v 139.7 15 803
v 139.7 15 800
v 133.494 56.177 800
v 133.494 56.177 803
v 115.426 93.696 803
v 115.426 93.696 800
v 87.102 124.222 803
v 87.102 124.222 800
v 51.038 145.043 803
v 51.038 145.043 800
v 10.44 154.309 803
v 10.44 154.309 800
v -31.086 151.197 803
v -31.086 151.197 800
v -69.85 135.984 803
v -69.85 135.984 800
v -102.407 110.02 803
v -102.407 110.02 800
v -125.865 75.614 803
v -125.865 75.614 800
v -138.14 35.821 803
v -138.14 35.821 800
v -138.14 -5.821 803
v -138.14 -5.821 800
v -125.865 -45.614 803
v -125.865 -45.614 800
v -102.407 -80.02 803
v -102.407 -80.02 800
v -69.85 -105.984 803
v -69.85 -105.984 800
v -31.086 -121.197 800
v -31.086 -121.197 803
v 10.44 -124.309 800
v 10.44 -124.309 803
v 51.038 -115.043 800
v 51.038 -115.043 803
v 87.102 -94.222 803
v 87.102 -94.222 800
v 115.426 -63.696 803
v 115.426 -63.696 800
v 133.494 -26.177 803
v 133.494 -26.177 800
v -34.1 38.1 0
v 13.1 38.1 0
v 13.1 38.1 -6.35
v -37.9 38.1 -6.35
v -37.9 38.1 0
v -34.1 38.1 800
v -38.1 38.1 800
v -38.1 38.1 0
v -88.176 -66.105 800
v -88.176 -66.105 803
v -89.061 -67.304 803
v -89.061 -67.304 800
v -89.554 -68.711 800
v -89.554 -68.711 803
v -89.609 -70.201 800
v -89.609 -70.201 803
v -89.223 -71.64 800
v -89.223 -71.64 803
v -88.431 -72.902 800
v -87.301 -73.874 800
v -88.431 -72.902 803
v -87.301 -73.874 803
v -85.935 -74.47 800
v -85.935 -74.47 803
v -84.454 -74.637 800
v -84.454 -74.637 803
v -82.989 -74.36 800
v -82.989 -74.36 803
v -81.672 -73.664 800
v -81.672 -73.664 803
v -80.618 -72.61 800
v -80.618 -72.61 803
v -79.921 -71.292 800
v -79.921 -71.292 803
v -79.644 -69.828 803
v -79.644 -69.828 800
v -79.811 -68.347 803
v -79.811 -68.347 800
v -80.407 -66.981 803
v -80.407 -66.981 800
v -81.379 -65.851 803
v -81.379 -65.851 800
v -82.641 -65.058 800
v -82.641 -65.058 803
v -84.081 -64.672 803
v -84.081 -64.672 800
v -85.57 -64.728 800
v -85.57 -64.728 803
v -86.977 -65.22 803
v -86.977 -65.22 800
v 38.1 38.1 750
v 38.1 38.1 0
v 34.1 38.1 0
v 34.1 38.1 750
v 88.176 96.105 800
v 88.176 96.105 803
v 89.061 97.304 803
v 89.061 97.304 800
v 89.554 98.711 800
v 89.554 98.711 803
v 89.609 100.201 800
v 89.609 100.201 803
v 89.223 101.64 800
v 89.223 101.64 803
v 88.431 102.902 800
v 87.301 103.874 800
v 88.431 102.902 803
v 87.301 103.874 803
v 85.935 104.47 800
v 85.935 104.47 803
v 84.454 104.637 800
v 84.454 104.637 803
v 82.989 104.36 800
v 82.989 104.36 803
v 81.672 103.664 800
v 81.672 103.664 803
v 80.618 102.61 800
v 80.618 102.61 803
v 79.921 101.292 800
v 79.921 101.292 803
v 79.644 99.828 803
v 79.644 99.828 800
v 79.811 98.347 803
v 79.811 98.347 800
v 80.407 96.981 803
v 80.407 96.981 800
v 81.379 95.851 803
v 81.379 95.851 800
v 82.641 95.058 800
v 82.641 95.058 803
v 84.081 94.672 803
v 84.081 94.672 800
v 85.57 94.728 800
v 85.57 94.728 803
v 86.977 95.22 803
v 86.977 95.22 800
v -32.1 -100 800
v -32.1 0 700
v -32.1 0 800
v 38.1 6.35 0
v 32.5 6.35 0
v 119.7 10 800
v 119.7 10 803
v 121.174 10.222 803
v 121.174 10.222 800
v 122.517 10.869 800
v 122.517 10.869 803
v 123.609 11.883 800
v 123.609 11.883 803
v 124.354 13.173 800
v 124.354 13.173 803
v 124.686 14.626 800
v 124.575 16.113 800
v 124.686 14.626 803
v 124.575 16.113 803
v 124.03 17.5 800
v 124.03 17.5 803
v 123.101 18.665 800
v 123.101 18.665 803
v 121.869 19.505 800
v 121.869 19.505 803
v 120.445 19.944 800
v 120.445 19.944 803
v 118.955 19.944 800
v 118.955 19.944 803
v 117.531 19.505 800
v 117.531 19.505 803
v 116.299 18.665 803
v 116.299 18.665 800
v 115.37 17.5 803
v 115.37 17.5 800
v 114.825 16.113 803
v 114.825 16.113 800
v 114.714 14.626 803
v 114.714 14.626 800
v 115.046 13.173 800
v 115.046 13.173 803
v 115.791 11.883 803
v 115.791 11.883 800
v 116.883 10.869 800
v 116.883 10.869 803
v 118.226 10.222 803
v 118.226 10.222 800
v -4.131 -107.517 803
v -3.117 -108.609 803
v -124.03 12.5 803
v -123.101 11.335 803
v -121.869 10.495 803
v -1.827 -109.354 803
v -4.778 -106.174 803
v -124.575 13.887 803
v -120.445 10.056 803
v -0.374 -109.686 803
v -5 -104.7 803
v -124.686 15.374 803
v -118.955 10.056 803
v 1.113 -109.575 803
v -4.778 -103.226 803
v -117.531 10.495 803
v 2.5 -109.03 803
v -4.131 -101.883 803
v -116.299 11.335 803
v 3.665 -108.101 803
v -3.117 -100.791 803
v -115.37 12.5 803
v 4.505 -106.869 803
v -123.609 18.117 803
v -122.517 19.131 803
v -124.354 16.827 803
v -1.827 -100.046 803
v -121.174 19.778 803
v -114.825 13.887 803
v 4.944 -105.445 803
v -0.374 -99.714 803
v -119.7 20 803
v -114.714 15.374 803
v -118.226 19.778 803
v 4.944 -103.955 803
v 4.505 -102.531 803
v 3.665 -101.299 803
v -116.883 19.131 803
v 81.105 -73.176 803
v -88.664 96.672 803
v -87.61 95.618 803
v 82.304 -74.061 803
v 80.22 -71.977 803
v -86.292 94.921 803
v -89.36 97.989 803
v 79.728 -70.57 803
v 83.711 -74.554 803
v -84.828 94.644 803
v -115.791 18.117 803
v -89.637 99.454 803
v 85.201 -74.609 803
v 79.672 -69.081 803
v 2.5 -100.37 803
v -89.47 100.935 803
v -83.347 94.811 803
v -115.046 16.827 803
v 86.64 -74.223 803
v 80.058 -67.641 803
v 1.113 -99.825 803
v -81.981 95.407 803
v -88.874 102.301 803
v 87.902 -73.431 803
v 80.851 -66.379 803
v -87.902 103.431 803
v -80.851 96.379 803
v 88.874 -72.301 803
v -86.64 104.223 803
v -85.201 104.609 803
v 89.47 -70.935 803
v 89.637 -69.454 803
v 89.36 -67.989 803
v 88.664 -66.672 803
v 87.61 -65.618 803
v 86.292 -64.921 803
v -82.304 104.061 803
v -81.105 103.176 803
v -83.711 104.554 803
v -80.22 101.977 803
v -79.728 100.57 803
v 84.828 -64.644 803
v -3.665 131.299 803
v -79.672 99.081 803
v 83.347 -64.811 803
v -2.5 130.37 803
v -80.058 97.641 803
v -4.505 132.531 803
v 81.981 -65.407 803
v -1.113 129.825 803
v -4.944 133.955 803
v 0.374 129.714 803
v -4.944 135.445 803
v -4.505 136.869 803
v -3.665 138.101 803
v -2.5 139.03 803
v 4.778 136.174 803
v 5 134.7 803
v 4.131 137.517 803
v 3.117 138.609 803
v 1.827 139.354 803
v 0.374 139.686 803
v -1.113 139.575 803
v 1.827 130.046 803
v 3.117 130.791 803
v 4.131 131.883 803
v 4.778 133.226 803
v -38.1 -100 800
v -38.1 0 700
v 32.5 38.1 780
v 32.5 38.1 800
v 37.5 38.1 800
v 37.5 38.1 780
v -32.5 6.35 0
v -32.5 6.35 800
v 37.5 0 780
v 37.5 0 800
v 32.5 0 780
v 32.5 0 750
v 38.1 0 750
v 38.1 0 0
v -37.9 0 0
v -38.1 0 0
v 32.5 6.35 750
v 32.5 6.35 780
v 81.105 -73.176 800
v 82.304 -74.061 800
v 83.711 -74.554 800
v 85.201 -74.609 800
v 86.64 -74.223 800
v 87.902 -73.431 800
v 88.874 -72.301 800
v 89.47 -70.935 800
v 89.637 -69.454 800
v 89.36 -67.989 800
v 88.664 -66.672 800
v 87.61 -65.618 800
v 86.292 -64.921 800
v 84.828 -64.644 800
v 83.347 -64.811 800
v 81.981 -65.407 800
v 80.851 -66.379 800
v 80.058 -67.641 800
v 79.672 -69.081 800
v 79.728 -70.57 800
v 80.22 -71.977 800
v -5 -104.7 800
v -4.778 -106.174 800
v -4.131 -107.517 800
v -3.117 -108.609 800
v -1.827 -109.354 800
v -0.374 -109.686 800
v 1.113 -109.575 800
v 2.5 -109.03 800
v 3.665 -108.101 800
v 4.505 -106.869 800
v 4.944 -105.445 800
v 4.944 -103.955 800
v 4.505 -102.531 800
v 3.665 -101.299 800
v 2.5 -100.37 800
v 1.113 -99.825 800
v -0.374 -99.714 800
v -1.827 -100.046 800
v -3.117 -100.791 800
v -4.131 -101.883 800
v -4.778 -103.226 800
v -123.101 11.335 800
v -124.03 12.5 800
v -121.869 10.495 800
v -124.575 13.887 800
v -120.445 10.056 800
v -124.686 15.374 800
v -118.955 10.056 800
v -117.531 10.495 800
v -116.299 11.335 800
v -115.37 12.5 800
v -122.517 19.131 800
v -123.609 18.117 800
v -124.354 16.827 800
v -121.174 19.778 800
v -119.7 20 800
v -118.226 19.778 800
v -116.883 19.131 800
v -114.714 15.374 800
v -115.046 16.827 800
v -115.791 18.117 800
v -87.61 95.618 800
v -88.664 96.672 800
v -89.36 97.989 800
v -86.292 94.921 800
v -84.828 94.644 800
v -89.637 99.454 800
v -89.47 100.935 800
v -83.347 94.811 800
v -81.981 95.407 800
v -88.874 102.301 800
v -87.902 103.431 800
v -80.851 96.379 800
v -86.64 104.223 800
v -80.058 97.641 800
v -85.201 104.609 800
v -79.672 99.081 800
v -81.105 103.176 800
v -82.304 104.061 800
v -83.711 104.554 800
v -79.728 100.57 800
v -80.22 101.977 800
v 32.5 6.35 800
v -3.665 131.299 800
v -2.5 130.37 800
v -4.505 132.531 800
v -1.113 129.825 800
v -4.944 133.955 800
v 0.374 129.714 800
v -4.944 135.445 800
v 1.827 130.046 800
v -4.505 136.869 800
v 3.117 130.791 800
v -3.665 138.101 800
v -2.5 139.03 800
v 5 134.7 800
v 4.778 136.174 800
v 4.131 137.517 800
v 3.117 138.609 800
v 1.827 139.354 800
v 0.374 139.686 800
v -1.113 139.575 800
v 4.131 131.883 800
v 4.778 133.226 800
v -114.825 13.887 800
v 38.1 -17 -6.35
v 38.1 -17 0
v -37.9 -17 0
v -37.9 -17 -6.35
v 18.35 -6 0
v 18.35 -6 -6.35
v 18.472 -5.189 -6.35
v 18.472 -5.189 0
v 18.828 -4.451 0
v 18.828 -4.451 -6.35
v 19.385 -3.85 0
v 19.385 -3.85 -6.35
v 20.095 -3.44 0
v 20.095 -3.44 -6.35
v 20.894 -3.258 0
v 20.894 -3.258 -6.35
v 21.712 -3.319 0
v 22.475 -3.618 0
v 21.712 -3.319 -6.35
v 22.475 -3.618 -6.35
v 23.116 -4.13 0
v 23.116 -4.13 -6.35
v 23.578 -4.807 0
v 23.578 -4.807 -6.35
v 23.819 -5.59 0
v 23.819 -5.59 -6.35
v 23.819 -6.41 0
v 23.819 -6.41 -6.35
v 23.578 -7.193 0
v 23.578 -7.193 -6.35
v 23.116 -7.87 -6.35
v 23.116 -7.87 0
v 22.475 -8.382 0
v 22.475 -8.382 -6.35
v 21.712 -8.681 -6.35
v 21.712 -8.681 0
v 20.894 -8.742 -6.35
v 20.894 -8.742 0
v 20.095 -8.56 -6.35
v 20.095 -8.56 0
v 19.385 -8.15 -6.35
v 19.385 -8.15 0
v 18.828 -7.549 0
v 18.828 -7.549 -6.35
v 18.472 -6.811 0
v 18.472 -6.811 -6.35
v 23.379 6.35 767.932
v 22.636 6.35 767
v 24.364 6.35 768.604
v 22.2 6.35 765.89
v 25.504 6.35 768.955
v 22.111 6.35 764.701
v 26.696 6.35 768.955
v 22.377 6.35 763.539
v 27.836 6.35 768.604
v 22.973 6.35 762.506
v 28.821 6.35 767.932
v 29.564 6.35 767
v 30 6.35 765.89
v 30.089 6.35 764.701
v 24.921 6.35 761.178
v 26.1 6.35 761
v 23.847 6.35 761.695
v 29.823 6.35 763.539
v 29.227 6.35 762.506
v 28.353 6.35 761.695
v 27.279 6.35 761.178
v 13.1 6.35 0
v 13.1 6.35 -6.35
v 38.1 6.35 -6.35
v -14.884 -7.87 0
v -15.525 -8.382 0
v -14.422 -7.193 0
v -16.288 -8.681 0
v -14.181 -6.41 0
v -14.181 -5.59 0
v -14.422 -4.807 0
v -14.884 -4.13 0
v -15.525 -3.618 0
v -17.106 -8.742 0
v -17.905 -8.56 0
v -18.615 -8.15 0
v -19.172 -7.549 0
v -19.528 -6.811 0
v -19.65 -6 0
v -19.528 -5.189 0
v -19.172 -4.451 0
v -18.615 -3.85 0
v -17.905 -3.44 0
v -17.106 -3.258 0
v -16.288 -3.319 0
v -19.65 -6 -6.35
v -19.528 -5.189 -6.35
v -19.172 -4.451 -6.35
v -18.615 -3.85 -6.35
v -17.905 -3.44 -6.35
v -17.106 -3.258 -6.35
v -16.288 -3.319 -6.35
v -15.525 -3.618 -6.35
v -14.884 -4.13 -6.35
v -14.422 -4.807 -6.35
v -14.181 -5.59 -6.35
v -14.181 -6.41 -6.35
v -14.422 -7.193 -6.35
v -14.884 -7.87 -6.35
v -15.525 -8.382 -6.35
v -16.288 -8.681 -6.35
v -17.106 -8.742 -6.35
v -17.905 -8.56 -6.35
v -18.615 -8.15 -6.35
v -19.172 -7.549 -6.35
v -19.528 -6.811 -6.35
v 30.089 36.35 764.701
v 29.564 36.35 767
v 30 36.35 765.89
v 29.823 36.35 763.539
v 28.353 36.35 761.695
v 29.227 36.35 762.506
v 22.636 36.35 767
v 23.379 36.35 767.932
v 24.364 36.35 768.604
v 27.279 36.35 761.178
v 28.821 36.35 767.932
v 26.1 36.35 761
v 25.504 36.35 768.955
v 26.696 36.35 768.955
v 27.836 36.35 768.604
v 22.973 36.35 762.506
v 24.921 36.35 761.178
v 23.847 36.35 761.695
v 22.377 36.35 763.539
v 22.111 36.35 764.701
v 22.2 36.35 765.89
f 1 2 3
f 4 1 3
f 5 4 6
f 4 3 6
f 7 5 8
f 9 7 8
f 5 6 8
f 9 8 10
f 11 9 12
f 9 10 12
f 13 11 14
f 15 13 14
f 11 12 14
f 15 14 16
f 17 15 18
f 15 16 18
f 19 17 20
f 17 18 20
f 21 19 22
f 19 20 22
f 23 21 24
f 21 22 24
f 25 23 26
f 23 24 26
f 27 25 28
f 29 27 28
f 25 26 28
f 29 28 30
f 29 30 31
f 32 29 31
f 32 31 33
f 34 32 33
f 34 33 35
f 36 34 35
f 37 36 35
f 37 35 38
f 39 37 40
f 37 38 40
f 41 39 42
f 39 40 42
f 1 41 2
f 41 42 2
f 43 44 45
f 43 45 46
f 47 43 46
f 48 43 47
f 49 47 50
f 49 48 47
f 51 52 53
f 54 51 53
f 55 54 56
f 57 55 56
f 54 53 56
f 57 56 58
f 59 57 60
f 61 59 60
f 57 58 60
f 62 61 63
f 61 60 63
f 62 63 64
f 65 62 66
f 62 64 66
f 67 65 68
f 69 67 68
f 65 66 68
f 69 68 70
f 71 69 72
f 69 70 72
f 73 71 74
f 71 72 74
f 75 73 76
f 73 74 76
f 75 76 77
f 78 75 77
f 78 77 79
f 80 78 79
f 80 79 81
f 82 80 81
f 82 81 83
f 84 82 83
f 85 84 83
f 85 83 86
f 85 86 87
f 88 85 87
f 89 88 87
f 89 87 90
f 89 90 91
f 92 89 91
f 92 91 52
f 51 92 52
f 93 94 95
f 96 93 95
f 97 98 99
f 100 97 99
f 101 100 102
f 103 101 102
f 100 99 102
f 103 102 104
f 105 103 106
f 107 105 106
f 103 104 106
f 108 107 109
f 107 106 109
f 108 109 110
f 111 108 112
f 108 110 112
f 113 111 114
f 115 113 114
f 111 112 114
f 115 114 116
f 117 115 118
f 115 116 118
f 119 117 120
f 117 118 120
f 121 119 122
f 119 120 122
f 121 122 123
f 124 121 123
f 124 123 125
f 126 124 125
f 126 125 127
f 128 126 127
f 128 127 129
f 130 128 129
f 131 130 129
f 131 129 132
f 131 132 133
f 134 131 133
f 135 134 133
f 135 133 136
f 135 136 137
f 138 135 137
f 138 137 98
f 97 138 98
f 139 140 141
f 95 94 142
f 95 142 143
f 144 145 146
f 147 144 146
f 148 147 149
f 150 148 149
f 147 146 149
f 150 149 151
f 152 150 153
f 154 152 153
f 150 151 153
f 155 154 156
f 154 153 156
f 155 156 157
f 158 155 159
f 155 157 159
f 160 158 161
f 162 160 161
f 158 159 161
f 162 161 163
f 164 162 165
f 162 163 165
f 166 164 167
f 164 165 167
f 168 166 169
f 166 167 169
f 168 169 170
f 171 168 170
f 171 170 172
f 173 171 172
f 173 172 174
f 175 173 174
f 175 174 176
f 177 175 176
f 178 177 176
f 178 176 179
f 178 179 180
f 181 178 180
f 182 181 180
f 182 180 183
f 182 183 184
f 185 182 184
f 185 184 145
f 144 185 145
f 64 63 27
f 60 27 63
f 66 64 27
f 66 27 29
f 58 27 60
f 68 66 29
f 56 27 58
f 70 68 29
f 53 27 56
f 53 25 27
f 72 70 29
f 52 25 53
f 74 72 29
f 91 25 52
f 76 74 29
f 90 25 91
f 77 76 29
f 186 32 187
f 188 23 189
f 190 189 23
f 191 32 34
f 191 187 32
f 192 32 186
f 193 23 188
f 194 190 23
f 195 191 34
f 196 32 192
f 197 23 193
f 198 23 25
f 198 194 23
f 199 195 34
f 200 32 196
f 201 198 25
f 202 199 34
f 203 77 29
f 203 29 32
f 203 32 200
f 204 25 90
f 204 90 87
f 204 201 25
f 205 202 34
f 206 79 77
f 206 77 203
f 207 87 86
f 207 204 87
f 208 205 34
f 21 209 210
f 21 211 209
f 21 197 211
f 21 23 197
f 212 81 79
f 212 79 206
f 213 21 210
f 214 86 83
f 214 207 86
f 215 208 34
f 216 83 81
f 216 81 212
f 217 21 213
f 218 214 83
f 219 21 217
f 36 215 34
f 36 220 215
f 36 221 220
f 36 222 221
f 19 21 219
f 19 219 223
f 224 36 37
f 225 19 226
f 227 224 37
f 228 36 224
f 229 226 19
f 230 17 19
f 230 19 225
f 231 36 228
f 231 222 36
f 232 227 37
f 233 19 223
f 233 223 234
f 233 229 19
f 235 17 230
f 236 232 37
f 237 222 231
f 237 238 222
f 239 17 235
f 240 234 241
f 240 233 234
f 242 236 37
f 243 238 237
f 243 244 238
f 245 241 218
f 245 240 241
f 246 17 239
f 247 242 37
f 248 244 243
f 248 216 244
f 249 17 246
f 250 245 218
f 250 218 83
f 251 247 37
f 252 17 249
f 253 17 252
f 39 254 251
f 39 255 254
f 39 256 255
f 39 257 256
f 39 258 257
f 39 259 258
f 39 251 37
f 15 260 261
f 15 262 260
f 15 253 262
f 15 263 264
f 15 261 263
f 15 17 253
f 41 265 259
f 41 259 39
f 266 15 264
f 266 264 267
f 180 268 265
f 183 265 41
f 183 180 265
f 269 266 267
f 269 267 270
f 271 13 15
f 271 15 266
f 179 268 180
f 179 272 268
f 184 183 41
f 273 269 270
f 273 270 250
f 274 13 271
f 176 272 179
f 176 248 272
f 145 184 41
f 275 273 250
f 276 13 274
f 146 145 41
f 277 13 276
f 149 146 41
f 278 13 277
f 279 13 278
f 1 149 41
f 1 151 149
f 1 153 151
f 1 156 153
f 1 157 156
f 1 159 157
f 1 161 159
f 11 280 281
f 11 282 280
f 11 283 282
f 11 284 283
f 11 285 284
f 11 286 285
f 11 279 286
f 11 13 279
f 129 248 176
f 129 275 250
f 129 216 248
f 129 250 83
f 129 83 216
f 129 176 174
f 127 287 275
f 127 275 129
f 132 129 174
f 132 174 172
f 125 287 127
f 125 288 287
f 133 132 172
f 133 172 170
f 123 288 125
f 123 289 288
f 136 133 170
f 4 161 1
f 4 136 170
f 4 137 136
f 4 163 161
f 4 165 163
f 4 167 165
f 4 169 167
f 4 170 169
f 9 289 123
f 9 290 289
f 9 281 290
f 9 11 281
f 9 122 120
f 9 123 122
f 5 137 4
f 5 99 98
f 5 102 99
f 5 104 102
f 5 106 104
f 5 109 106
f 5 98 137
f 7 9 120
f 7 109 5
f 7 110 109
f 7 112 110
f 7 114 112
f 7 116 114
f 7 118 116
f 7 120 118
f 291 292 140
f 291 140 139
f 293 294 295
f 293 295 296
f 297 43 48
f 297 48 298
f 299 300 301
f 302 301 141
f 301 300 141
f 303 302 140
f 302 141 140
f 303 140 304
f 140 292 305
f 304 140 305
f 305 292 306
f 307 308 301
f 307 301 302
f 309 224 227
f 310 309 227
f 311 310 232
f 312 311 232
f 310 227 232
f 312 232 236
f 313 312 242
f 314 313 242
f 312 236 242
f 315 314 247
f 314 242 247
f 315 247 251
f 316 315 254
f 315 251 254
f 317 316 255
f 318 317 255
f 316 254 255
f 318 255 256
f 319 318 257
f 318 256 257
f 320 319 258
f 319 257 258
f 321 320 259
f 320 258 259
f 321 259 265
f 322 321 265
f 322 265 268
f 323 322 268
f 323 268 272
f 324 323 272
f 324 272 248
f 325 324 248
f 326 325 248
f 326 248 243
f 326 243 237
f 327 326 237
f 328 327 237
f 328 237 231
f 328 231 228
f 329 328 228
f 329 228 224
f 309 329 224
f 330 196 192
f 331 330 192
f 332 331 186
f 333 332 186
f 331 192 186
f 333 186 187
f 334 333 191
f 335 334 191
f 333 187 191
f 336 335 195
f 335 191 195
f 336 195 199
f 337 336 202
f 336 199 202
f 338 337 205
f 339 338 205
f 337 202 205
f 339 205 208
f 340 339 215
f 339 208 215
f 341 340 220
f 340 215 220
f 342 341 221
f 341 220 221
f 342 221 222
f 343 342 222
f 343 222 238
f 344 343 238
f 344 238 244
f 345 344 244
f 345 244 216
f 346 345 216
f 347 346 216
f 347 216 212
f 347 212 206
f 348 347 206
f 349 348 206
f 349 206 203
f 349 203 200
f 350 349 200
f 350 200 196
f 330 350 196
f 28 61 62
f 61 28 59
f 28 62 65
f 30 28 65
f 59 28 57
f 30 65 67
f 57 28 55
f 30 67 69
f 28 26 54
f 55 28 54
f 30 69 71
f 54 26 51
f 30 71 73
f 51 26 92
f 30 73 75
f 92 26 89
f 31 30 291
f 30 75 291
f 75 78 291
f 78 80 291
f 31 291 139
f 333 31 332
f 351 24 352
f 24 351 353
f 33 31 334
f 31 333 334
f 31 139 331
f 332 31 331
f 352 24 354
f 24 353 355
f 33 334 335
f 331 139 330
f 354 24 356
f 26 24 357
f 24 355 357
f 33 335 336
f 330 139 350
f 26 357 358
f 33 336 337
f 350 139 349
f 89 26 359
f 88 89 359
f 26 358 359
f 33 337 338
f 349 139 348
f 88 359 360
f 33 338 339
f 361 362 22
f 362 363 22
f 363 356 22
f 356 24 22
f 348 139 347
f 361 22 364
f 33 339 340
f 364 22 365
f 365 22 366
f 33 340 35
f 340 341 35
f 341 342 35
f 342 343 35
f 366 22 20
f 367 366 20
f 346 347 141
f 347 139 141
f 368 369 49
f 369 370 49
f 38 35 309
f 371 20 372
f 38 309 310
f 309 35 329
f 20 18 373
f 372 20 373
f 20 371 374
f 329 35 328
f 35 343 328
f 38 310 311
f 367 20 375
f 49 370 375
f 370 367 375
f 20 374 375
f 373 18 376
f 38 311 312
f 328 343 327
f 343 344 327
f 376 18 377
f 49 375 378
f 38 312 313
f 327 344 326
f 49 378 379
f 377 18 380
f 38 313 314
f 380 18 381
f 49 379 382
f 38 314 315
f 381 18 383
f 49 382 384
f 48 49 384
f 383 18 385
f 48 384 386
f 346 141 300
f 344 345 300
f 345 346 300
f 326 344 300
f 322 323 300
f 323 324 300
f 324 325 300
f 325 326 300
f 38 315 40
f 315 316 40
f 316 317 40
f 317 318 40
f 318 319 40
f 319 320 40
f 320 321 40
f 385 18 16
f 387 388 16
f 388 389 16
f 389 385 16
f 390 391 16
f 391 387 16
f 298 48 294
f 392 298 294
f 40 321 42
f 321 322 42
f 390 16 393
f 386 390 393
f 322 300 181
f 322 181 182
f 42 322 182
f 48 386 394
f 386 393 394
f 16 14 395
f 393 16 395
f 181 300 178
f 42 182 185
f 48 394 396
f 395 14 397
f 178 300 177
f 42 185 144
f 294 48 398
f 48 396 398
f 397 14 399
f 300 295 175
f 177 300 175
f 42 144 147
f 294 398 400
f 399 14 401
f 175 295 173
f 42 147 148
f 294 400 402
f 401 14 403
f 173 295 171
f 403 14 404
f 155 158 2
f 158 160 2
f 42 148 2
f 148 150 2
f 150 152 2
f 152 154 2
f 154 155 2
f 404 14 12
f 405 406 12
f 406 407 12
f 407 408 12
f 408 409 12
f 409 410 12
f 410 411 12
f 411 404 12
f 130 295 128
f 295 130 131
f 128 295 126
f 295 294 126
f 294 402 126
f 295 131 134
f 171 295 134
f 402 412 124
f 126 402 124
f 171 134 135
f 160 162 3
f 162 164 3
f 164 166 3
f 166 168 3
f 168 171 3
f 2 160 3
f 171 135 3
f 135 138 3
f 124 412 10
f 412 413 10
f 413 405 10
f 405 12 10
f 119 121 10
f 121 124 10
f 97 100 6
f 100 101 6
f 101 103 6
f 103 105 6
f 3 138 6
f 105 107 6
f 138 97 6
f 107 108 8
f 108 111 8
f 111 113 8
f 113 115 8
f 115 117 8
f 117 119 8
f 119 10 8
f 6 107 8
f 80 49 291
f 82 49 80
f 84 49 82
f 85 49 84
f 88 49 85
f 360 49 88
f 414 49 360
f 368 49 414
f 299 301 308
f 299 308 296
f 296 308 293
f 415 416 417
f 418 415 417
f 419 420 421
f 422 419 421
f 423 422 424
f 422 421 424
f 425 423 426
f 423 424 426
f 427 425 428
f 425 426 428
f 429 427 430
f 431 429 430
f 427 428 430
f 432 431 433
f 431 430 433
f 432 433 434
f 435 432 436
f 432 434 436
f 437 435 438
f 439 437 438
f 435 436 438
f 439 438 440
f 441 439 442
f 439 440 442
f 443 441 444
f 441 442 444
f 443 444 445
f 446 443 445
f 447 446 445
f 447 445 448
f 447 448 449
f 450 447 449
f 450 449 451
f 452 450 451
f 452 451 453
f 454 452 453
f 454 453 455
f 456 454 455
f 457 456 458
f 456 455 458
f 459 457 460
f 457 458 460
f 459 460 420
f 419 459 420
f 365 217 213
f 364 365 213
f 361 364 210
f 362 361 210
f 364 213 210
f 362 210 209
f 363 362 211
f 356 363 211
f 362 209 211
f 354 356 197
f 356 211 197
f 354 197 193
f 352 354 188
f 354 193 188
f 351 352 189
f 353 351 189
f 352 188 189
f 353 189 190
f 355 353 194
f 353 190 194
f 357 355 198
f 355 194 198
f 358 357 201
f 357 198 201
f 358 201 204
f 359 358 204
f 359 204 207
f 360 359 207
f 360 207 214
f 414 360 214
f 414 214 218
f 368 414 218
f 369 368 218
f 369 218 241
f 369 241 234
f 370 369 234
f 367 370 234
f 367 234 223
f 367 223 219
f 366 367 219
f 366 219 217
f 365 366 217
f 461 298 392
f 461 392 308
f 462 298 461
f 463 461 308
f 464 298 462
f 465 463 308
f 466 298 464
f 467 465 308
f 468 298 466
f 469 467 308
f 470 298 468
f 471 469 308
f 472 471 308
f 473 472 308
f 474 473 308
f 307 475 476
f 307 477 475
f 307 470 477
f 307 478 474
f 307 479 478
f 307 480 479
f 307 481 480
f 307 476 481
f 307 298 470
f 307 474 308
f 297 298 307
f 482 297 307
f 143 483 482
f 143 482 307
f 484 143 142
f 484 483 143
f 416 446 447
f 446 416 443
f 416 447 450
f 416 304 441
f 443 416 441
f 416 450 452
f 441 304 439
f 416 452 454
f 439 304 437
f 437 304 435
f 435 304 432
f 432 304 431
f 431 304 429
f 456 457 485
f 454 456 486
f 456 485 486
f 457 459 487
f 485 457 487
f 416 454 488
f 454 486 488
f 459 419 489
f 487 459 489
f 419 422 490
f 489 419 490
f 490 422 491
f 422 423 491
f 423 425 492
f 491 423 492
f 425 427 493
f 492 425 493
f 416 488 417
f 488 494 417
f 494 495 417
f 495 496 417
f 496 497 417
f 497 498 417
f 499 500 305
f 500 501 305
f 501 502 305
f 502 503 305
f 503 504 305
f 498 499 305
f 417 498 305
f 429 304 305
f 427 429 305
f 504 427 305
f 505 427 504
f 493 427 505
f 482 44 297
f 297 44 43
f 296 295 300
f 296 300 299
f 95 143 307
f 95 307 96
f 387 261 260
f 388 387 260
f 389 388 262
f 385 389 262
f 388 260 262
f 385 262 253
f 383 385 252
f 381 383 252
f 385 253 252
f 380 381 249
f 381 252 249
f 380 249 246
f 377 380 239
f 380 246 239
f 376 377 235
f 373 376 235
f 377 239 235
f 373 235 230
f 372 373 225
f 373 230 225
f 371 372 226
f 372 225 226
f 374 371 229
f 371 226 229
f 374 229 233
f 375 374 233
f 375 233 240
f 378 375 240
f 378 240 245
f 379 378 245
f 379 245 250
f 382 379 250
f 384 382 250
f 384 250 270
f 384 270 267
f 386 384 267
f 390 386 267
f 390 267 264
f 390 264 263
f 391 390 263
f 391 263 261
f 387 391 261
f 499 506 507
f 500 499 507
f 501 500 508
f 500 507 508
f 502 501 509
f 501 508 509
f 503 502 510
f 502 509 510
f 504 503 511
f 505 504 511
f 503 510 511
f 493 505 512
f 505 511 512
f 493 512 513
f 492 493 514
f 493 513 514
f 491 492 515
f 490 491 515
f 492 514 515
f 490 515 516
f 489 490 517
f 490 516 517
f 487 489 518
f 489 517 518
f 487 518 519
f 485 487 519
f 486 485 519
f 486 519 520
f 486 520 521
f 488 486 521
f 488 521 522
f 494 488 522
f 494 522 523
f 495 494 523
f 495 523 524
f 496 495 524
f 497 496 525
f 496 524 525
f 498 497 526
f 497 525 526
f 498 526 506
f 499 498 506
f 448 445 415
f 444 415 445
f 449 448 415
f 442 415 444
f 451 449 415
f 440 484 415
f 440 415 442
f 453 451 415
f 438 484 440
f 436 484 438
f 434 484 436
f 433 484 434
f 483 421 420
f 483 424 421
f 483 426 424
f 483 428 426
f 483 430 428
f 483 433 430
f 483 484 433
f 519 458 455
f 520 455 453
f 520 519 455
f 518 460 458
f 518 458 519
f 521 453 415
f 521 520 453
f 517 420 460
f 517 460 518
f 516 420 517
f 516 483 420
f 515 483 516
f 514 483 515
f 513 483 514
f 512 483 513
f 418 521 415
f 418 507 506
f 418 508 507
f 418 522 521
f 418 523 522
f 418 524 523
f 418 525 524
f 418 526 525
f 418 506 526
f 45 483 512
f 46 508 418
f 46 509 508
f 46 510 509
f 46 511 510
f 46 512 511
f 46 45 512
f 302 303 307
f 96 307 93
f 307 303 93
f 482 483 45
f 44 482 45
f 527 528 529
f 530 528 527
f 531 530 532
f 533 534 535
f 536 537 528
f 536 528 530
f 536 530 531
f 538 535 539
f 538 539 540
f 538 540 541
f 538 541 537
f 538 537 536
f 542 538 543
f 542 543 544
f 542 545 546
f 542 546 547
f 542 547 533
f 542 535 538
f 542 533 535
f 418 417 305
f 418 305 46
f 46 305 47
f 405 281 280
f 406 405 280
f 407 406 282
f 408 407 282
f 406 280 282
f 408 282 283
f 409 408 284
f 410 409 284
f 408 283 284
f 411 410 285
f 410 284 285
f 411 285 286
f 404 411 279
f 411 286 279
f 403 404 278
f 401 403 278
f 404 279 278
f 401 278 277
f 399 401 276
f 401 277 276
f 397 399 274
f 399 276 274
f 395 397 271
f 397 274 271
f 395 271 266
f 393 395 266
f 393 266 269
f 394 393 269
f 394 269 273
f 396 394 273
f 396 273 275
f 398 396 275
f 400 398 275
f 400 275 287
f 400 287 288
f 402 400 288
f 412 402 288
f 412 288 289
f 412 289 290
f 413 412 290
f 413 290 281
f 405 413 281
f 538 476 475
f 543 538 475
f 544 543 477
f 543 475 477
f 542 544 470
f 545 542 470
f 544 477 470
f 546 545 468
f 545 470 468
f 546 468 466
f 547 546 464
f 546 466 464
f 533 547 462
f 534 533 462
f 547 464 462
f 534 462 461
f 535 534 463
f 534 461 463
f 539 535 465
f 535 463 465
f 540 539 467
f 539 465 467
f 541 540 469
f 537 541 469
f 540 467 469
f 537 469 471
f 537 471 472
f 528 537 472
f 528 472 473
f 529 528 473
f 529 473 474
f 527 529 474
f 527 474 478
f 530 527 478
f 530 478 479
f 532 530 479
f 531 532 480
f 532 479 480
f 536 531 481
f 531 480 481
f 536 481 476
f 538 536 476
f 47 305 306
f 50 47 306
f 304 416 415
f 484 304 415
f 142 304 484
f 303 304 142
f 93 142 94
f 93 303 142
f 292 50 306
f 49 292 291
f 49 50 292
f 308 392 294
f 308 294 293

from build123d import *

# Parameters (mm, degrees)
BOSS_EXTRUDE1_DEPTH = 800
SKETCH4_W           = 50
SKETCH4_H           = 38.1
CUT_EXTRUDE2_DEPTH  = 5.6
SKETCH5_R           = 4
BOSS_EXTRUDE2_DEPTH = 30
SKETCH6_W           = 20
SKETCH6_H           = 38.1
BOSS_EXTRUDE3_DEPTH = 5
SKETCH7_W           = 76
SKETCH7_H           = 55.1
BOSS_EXTRUDE4_DEPTH = 6.35
SKETCH8_R           = 139.7
BOSS_EXTRUDE5_DEPTH = 3
SKETCH9_W           = 25
SKETCH9_H           = 31.75
CUT_EXTRUDE3_DEPTH  = 6.35
SKETCH10_R          = 2.75
CUT_EXTRUDE4_DEPTH  = 6.35
CUT_EXTRUDE5_REACH  = 837.76
SKETCH11_R          = 5
CIRPATTERN1_COUNT   = 8
BOSS_EXTRUDE6_DEPTH = 6


with BuildPart() as part:
    # Sketch1 → Boss-Extrude1 (new body)
    with BuildSketch(Plane.XY):
        Polygon((38.1, 0), (-38.1, 0), (-38.1, 38.1), (-34.1, 38.1), (-32.5, 6.35), (32.5, 6.35), (34.1, 38.1), (38.1, 38.1), align=None)
    extrude(amount=BOSS_EXTRUDE1_DEPTH)

    # Sketch4 → Cut-Extrude2 (cut)
    with BuildSketch(Plane(origin=(38.1, 0, 0), x_dir=(0, 0, -1), z_dir=(1, 0, 0))):
        with Locations((-775, 19.05)):
            Rectangle(SKETCH4_W, SKETCH4_H)
    extrude(amount=-CUT_EXTRUDE2_DEPTH, mode=Mode.SUBTRACT)

    # Sketch5 → Boss-Extrude2 (add)
    with BuildSketch(Plane(origin=(0, 6.35, 0), x_dir=(1, 0, 0), z_dir=(0, 1, 0))):
        with Locations(Location((26.1, -765, 0), (0, 0, 90))):
            Circle(SKETCH5_R)
    extrude(amount=BOSS_EXTRUDE2_DEPTH)

    # Sketch6 → Boss-Extrude3 (add)
    with BuildSketch(Plane(origin=(32.5, 0, 0), x_dir=(0, 0, -1), z_dir=(1, 0, 0))):
        with Locations((-790, 19.05)):
            Rectangle(SKETCH6_W, SKETCH6_H)
    extrude(amount=BOSS_EXTRUDE3_DEPTH)

    # Sketch7 → Boss-Extrude4 (add)
    with BuildSketch(Plane(origin=(0, 0, 0), x_dir=(-1, 0, 0), z_dir=(0, 0, -1))):
        with Locations((-0.1, 10.55)):
            Rectangle(SKETCH7_W, SKETCH7_H)
    extrude(amount=BOSS_EXTRUDE4_DEPTH)

    # Sketch8 → Boss-Extrude5 (add)
    with BuildSketch(Plane.XY.offset(800)):
        with Locations((0, 15)):
            Circle(SKETCH8_R)
    extrude(amount=BOSS_EXTRUDE5_DEPTH)

    # Sketch9 → Cut-Extrude3 (cut)
    with BuildSketch(Plane(origin=(0, 0, -6.35), x_dir=(-1, 0, 0), z_dir=(0, 0, -1))):
        with Locations((-25.6, 22.225)):
            Rectangle(SKETCH9_W, SKETCH9_H)
    extrude(amount=-CUT_EXTRUDE3_DEPTH, mode=Mode.SUBTRACT)

    # Sketch10 → Cut-Extrude4 (cut)
    with BuildSketch(Plane(origin=(0, 0, -6.35), x_dir=(-1, 0, 0), z_dir=(0, 0, -1))):
        with Locations((-21.1, -6)):
            Circle(SKETCH10_R)
        with Locations((16.9, -6)):
            Circle(SKETCH10_R)
    extrude(amount=-CUT_EXTRUDE4_DEPTH, mode=Mode.SUBTRACT)

    # Sketch11 → Cut-Extrude5 (cut, up to next)
    with BuildSketch(Plane.XY.offset(803), mode=Mode.PRIVATE) as cut_extrude5_sk1:
        with Locations((0, 134.7)):
            Circle(SKETCH11_R)
    cut_extrude5_tool1 = extrude(cut_extrude5_sk1.sketch, amount=-CUT_EXTRUDE5_REACH, mode=Mode.PRIVATE) & part.part
    cut_extrude5 = cut_extrude5_tool1.solids().sort_by_distance((0, 134.7, 803))[0]
    add(cut_extrude5, mode=Mode.SUBTRACT)

    # CirPattern1: Cut-Extrude5 ×8 about axis
    cirpattern1_axis = Axis((0, 15, 0), (0, 0, 1))
    for i in range(1, CIRPATTERN1_COUNT):
        add(cut_extrude5.rotate(cirpattern1_axis, i * 360 / CIRPATTERN1_COUNT), mode=Mode.SUBTRACT)

    # Sketch12 → Boss-Extrude6 (add)
    with BuildSketch(Plane.ZY.offset(38.1)):
        Polygon((700, 0), (800, -100), (800, 0), align=None)
    extrude(amount=-BOSS_EXTRUDE6_DEPTH)


solid = part.part
